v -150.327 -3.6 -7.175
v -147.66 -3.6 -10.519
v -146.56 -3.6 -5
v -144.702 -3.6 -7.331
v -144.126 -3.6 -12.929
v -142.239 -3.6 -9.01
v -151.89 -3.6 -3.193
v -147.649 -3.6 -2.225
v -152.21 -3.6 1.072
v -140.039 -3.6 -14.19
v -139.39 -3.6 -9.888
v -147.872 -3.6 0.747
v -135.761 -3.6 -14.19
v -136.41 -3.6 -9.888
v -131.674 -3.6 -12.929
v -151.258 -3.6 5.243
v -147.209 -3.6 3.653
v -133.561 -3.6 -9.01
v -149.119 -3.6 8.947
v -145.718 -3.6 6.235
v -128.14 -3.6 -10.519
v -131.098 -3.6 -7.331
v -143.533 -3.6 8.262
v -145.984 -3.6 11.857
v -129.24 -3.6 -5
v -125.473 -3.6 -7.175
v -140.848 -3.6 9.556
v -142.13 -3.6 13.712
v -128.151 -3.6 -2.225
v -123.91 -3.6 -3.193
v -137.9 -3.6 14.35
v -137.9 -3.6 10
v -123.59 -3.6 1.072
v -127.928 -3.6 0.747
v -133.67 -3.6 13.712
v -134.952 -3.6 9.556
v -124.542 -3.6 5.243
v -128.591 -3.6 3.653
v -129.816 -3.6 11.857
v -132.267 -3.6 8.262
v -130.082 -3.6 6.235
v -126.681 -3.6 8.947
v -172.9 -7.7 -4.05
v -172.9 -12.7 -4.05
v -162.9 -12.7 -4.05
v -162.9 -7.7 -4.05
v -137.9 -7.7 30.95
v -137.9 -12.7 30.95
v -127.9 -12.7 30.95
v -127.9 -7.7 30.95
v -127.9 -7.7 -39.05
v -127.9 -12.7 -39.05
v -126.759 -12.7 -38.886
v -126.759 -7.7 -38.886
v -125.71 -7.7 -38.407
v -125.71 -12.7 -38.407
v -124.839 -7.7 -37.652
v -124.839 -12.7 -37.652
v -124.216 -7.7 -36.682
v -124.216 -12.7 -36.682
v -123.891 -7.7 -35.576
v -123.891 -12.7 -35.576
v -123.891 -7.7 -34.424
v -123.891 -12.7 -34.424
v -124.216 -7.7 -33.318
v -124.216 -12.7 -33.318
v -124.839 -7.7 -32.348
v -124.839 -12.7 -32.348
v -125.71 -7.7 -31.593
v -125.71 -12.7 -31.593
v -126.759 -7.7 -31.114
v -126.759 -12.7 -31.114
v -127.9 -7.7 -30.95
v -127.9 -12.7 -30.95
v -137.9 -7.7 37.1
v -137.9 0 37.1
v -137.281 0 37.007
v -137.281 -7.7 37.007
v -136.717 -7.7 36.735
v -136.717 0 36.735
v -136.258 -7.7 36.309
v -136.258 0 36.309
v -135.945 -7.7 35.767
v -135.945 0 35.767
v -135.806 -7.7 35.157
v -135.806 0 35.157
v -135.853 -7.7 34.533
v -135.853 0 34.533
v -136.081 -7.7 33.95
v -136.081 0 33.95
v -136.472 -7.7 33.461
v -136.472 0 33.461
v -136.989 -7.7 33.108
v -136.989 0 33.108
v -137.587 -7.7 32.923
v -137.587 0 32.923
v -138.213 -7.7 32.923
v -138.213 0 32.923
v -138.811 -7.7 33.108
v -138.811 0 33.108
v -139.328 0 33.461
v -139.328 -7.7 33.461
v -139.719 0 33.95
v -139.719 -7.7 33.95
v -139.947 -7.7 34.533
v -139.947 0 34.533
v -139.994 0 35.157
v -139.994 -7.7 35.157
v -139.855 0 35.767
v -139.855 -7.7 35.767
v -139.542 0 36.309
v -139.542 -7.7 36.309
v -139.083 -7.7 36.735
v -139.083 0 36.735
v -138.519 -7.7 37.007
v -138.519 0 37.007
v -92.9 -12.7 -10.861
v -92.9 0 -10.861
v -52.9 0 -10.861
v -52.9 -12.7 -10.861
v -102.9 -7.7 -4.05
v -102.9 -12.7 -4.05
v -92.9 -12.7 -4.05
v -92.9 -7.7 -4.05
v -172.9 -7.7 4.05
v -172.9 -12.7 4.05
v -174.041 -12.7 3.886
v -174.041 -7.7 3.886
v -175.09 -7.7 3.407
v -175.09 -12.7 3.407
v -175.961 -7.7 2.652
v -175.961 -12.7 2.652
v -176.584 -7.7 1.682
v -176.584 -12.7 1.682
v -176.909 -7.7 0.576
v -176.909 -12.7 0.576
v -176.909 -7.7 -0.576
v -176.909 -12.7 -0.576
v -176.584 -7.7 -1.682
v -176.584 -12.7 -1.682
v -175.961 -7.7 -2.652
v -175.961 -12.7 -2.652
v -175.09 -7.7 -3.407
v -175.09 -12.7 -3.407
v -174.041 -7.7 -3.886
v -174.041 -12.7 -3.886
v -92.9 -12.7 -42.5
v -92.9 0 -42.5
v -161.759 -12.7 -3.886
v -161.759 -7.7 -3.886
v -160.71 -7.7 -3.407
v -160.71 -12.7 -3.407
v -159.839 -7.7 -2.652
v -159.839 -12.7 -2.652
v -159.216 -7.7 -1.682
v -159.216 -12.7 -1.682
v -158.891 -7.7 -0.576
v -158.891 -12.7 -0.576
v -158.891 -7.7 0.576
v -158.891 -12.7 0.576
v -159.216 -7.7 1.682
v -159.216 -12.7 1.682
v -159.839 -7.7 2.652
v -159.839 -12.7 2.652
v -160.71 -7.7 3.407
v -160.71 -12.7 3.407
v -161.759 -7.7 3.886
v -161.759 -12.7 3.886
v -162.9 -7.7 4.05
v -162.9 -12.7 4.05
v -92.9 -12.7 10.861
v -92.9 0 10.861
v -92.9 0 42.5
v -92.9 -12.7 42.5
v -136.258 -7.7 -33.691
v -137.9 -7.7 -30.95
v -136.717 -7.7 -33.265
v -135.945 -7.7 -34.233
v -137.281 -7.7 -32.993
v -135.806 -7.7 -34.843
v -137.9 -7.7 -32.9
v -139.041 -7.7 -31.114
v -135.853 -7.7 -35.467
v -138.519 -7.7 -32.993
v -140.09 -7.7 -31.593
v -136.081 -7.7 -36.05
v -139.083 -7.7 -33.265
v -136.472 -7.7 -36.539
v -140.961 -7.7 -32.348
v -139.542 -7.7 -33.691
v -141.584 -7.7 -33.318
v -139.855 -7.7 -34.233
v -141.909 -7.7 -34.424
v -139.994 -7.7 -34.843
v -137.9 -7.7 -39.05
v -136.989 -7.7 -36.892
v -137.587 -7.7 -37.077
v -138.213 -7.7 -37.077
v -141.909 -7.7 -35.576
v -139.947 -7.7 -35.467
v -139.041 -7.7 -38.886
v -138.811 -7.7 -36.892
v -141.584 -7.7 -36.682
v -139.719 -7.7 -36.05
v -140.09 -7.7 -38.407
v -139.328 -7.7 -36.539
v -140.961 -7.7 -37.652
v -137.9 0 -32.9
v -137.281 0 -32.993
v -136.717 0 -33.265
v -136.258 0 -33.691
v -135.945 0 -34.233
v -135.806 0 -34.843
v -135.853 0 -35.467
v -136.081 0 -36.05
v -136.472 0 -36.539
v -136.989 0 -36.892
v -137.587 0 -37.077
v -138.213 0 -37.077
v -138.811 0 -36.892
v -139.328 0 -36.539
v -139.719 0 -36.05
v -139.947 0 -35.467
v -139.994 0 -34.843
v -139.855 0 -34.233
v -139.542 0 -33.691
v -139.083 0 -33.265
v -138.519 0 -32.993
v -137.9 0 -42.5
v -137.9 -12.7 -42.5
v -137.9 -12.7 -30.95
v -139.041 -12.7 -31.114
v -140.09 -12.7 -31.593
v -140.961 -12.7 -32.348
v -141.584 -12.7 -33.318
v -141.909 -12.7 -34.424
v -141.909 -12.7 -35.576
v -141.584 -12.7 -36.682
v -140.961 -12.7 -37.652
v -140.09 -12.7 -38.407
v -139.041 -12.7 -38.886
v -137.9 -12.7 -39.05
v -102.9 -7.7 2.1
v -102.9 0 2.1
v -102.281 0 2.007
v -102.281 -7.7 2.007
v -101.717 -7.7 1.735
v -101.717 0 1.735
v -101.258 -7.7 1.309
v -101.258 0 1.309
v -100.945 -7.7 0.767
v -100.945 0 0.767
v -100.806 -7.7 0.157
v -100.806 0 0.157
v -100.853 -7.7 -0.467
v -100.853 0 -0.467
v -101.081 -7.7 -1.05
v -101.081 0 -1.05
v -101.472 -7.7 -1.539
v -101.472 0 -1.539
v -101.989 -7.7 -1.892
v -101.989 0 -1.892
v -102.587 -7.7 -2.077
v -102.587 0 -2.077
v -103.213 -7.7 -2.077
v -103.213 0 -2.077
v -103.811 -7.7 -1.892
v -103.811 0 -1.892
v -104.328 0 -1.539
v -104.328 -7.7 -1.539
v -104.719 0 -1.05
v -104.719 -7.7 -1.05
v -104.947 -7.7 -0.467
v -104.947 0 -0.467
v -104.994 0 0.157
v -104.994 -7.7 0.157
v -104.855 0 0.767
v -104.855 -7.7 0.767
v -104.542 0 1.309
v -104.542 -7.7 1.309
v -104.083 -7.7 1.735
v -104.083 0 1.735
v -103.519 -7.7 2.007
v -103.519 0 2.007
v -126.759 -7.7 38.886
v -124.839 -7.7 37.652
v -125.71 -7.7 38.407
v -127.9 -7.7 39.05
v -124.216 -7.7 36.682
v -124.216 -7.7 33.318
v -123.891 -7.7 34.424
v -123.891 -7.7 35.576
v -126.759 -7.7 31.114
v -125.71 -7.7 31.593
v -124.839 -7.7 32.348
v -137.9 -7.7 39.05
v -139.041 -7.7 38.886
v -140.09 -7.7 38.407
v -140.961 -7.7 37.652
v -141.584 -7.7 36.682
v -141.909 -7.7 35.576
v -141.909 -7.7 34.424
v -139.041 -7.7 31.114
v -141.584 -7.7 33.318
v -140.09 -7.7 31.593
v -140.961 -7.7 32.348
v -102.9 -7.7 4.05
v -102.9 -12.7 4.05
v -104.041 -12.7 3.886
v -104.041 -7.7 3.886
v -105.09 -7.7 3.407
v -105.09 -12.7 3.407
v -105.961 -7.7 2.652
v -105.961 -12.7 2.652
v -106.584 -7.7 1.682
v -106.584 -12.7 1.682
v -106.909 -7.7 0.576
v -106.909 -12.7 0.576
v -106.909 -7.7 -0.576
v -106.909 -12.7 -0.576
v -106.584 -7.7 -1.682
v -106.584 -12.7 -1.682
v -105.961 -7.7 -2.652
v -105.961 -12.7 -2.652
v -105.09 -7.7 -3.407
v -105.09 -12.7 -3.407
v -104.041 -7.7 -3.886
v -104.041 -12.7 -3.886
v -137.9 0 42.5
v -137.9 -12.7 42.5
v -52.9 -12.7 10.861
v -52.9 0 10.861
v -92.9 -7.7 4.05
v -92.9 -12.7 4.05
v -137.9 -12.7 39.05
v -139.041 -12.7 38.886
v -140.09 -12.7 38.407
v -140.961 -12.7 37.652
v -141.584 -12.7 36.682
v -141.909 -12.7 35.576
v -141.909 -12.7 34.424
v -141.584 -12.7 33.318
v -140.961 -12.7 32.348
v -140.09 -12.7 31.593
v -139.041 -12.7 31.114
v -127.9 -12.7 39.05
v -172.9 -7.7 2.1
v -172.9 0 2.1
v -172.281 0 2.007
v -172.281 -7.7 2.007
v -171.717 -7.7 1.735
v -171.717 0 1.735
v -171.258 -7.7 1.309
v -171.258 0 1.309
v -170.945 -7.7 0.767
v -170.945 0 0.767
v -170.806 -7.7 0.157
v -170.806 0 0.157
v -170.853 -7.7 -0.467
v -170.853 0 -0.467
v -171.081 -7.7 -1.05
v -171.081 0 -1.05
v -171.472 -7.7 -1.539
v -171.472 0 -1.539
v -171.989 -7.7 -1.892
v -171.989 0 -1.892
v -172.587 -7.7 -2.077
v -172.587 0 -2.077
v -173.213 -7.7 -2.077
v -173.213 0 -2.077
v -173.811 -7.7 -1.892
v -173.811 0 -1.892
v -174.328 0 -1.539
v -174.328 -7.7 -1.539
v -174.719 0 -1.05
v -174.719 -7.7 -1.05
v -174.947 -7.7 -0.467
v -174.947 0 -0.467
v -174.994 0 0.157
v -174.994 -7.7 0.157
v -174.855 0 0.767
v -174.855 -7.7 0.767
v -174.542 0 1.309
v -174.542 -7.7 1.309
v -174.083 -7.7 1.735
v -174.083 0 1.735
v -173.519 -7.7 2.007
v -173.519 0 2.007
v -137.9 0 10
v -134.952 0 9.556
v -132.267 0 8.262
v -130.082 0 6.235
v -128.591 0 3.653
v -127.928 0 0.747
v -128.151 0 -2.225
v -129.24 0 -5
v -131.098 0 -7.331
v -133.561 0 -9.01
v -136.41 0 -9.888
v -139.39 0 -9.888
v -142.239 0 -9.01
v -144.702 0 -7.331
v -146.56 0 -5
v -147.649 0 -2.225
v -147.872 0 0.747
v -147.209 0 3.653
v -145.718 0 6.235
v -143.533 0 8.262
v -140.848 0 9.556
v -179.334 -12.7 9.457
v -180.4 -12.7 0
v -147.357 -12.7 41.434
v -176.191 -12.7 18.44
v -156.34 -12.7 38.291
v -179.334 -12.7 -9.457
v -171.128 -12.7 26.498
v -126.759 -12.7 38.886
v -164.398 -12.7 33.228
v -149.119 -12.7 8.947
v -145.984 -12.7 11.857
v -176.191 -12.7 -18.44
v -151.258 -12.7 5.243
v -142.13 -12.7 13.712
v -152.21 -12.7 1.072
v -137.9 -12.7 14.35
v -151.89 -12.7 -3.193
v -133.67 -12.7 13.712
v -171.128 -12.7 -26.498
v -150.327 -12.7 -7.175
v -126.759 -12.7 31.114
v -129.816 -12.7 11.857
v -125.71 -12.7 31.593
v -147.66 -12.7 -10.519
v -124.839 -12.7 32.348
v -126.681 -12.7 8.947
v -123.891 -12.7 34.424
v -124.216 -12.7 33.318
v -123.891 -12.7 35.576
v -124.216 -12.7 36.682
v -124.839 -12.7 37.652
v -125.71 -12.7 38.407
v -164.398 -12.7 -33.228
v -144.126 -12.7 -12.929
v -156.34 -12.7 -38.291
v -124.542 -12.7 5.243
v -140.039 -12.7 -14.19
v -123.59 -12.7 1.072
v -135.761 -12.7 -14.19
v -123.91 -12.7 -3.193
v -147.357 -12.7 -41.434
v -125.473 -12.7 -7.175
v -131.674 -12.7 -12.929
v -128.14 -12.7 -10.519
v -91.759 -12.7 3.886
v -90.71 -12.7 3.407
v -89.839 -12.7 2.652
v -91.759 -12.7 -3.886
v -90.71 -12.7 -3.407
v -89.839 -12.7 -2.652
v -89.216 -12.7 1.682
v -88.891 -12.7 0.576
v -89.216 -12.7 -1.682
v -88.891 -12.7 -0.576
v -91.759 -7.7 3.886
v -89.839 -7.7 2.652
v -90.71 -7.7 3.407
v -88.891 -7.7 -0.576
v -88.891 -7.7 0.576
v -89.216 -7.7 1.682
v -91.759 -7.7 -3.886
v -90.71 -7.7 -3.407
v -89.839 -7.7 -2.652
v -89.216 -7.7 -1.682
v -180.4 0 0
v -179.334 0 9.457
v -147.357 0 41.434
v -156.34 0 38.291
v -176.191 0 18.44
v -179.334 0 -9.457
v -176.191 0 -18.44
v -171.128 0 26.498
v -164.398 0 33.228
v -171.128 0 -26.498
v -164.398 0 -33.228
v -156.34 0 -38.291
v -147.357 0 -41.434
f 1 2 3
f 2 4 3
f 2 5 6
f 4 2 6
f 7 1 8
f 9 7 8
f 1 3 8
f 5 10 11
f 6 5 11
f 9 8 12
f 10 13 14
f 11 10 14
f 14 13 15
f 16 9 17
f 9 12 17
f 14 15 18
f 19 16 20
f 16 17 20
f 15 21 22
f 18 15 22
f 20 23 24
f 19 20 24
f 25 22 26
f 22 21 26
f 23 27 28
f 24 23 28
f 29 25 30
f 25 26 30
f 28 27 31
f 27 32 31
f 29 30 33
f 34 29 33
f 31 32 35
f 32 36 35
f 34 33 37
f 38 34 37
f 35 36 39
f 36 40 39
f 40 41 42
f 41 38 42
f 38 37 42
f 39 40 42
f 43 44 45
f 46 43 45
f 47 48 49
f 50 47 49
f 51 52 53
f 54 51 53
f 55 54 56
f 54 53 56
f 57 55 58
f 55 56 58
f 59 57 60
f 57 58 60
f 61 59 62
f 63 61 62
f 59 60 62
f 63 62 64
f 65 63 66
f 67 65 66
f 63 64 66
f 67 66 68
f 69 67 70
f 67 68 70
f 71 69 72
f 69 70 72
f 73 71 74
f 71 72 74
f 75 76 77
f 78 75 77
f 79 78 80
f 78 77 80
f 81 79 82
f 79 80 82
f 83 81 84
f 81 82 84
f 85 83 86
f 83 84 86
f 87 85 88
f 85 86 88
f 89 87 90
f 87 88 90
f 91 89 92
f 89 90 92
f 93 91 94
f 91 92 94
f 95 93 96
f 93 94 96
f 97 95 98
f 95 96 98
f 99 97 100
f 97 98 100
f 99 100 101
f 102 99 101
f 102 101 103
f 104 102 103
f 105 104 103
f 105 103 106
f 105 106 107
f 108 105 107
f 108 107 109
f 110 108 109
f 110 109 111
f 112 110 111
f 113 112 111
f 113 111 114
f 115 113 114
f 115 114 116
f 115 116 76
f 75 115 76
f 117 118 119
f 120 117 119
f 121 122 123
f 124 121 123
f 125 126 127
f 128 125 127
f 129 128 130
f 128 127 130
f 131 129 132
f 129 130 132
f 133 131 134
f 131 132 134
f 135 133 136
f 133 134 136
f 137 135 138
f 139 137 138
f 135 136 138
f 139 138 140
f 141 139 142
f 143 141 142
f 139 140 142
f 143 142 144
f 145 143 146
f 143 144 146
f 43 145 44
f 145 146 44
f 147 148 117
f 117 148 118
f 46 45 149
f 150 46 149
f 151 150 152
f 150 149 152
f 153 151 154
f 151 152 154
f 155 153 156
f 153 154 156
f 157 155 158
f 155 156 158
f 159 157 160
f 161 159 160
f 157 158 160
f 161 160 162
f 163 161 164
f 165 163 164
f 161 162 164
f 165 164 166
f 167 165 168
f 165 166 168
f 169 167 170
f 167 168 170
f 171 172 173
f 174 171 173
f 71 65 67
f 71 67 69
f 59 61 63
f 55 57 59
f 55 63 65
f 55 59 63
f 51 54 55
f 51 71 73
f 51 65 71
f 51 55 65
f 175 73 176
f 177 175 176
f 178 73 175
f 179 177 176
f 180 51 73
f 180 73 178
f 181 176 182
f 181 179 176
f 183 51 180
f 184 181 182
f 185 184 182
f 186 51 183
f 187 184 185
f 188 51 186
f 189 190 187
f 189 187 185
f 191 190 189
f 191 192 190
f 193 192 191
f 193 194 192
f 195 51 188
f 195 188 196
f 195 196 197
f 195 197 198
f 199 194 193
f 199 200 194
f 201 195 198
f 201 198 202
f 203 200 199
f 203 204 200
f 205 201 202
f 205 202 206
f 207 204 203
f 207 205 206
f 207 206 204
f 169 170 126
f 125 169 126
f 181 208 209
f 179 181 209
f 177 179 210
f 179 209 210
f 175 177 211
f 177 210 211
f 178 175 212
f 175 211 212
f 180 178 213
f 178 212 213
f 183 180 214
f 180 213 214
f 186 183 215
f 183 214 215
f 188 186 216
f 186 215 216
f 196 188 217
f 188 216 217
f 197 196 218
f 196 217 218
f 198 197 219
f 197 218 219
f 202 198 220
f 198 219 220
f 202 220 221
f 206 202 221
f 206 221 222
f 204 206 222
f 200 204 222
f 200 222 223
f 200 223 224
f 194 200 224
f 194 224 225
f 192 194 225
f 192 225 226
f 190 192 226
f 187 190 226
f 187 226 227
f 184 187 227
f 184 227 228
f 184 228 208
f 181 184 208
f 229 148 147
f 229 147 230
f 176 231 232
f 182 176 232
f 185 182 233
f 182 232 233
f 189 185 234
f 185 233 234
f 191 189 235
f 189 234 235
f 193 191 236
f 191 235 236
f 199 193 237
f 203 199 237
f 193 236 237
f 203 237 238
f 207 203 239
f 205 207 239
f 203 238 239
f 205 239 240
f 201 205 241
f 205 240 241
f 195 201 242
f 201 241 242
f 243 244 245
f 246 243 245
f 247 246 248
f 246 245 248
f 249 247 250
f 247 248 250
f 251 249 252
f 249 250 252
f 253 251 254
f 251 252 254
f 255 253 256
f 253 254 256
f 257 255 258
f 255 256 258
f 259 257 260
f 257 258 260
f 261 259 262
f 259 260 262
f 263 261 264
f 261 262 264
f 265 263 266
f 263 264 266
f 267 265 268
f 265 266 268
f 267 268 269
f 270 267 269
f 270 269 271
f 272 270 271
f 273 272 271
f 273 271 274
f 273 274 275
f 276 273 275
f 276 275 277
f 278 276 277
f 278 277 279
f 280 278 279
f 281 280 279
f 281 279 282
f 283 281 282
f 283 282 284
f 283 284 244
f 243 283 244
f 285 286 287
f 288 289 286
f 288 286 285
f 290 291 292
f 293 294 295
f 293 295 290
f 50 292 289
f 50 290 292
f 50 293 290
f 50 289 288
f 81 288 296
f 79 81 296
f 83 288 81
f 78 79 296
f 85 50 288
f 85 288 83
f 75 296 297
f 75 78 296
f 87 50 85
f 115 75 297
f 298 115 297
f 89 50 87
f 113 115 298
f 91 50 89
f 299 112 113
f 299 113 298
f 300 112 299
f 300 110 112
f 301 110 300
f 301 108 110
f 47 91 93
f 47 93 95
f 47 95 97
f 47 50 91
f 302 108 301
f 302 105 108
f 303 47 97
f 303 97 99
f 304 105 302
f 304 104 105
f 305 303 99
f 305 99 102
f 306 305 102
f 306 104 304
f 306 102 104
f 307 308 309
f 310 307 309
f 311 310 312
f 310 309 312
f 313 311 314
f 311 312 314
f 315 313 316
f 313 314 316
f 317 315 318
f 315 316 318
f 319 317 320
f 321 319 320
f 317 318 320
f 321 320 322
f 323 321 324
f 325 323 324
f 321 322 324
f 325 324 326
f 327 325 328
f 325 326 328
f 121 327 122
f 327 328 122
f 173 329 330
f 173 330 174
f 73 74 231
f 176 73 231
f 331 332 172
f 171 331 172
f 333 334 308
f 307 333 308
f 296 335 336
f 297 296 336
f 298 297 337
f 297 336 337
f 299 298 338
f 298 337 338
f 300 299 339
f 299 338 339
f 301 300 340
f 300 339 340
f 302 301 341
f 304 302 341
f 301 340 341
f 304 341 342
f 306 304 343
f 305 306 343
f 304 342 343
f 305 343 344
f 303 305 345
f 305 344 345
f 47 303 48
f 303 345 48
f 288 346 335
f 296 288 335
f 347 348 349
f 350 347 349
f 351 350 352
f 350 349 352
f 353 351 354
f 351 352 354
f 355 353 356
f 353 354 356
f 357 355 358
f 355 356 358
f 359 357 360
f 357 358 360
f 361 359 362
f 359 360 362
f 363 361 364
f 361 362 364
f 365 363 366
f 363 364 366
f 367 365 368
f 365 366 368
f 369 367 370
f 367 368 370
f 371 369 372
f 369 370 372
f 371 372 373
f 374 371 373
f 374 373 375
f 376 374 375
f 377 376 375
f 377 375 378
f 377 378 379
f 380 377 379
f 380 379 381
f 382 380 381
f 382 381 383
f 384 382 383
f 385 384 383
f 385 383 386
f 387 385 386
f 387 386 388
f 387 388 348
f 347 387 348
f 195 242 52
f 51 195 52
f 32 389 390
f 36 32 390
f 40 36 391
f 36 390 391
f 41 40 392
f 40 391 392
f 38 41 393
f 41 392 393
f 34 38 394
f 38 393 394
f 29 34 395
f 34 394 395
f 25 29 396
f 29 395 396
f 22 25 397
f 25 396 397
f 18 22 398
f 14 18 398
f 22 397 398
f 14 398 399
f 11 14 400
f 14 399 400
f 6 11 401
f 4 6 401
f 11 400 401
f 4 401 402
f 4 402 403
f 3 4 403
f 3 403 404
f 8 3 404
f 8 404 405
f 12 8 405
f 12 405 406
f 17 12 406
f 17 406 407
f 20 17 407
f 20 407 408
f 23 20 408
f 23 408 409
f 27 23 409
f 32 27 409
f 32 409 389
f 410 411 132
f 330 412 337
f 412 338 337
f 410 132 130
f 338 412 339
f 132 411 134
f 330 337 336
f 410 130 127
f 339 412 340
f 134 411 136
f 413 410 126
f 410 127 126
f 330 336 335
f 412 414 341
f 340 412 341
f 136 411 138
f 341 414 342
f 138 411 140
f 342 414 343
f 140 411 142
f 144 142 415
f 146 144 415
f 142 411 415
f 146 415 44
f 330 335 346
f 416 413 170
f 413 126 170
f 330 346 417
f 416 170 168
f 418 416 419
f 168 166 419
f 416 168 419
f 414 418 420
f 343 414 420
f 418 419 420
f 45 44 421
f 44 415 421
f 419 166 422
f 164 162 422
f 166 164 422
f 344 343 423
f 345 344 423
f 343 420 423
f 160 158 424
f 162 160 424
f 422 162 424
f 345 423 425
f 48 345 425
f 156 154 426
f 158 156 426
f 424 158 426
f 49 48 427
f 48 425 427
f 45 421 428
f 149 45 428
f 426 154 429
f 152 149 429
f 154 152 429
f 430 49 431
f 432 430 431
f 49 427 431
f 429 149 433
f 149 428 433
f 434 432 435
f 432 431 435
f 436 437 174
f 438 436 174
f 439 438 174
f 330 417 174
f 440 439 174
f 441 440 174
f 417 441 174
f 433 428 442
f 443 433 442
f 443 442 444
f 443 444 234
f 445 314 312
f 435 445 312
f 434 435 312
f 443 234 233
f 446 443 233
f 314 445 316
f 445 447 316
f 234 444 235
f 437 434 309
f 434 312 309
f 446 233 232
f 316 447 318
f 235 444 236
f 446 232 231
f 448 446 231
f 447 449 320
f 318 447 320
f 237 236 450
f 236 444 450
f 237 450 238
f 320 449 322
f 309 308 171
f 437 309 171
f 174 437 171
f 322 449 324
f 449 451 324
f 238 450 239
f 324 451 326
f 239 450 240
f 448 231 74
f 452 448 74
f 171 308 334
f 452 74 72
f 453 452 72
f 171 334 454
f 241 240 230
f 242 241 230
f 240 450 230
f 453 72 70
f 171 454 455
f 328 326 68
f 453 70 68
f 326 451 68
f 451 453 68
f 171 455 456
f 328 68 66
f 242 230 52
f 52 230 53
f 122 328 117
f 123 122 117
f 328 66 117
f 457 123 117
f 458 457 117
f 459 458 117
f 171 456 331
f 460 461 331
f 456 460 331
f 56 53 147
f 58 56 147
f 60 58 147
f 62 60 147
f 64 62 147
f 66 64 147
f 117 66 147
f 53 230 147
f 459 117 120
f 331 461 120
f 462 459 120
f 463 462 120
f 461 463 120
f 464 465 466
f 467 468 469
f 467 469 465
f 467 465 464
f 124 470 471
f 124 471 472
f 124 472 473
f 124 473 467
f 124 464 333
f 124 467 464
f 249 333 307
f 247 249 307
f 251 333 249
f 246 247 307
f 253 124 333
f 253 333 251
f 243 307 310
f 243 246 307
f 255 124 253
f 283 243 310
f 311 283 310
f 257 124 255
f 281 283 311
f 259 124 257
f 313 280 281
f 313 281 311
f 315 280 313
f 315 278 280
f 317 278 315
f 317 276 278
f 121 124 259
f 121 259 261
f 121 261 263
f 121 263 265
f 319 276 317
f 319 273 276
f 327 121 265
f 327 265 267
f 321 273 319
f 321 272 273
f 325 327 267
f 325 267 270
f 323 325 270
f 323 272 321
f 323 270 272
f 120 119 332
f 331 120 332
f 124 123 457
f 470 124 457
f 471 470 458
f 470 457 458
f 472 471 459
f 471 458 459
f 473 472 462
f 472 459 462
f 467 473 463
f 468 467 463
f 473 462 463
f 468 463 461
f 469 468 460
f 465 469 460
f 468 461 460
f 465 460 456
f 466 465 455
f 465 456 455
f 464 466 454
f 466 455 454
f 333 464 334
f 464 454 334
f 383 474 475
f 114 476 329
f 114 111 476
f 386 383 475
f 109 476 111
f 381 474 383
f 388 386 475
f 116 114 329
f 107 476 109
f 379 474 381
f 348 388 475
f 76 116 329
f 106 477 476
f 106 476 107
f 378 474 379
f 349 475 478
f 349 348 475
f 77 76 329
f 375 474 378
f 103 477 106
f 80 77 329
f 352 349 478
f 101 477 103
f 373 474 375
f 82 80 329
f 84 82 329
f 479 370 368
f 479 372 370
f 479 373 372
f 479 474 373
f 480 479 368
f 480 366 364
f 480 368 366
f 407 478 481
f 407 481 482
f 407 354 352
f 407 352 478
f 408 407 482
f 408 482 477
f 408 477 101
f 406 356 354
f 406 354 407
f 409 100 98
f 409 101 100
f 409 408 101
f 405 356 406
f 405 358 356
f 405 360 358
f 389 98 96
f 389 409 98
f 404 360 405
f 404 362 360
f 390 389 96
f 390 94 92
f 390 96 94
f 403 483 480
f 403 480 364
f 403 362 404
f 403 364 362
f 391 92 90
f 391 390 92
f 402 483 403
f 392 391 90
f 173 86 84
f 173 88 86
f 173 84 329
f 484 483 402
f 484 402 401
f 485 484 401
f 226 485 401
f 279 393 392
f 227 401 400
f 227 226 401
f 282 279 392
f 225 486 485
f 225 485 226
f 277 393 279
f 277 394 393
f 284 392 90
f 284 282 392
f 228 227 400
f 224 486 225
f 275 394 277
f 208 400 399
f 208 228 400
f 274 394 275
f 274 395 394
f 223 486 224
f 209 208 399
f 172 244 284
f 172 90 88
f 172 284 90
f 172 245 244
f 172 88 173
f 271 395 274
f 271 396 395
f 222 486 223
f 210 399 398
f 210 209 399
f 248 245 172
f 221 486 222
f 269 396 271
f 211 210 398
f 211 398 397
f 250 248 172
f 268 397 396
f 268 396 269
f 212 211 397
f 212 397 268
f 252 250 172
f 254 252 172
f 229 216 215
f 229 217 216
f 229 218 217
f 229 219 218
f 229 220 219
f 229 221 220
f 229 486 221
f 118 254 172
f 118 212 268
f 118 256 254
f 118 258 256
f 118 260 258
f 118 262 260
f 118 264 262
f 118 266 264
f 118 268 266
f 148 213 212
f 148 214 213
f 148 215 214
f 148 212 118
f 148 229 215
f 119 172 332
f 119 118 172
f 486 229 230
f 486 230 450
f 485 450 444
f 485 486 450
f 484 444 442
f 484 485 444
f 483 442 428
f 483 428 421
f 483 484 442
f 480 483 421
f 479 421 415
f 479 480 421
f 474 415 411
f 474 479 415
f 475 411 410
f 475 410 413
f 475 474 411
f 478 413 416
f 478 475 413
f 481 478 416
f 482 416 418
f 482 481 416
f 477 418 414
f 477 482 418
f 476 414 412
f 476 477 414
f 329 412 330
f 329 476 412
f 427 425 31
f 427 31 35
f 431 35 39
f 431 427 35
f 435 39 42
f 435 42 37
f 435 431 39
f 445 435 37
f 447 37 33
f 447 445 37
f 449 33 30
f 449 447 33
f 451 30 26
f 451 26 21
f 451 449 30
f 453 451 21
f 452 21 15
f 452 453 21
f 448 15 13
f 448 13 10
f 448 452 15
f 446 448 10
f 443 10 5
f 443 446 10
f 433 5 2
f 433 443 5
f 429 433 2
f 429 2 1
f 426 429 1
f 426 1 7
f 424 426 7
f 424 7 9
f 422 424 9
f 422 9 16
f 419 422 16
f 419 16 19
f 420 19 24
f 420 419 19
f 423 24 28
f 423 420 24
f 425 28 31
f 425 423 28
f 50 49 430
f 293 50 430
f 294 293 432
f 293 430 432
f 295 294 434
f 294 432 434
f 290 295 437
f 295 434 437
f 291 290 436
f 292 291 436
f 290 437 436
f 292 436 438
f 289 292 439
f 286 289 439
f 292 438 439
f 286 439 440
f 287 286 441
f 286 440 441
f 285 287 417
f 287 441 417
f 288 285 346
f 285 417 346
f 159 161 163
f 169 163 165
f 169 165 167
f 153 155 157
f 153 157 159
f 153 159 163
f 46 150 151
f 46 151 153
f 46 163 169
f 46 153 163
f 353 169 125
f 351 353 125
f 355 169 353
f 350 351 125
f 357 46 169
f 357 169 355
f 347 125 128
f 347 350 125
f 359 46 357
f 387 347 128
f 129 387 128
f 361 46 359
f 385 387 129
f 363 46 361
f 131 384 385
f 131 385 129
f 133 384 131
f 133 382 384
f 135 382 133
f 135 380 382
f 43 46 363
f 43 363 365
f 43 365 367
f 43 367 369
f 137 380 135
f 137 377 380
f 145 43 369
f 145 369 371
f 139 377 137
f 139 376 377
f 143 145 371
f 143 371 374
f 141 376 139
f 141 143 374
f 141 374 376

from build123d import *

# Parameters (mm, degrees)
SKETCH1_R           = 2.1
SKETCH1_R_2         = 10
BOSS_EXTRUDE1_DEPTH = 12.7
SKETCH2_R           = 14.35
CUT_EXTRUDE1_DEPTH  = 8.1
CUT_EXTRUDE2_START  = -12.7
SKETCH3_R           = 14.35
CUT_EXTRUDE2_DEPTH  = 9.1
CUT_EXTRUDE3_START  = -12.7
CUT_EXTRUDE3_DEPTH  = 5
CUT_EXTRUDE4_DEPTH  = 20


with BuildPart() as part:
    # Sketch1 → Boss-Extrude1 (new body)
    with BuildSketch(Plane(origin=(0, 0, 0), x_dir=(1, 0, 0), z_dir=(0, 1, 0))):
        with BuildLine():
            Line((0, 42.5), (-137.9, 42.5))
            ThreePointArc((-137.9, 42.5), (-180.4, 0), (-137.9, -42.5))
            Line((-137.9, -42.5), (0, -42.5))
            ThreePointArc((0, -42.5), (42.5, 0), (0, 42.5))
        make_face()
        with Locations(Location((-102.9, 0, 0), (0, 0, 270))):
            Circle(SKETCH1_R, mode=Mode.SUBTRACT)
        with Locations(Location((-137.9, 35, 0), (0, 0, 270))):
            Circle(SKETCH1_R, mode=Mode.SUBTRACT)
        with Locations(Location((-137.9, -35, 0), (0, 0, 270))):
            Circle(SKETCH1_R, mode=Mode.SUBTRACT)
        with Locations(Location((-172.9, 0, 0), (0, 0, 270))):
            Circle(SKETCH1_R, mode=Mode.SUBTRACT)
        with Locations(Location((-137.9, 0, 0), (0, 0, 270))):
            Circle(SKETCH1_R_2, mode=Mode.SUBTRACT)
        with Locations(Location((0, 35, 0), (0, 0, 270))):
            Circle(SKETCH1_R, mode=Mode.SUBTRACT)
        with Locations(Location((0, -35, 0), (0, 0, 270))):
            Circle(SKETCH1_R, mode=Mode.SUBTRACT)
        with Locations(Location((-17.67766953, -17.67766953, 0), (0, 0, 270))):
            Circle(SKETCH1_R, mode=Mode.SUBTRACT)
        with Locations(Location((17.67766953, -17.67766953, 0), (0, 0, 270))):
            Circle(SKETCH1_R, mode=Mode.SUBTRACT)
        with Locations(Location((-35, 0, 0), (0, 0, 270))):
            Circle(SKETCH1_R, mode=Mode.SUBTRACT)
        with Locations(Location((-17.67766953, 17.67766953, 0), (0, 0, 270))):
            Circle(SKETCH1_R, mode=Mode.SUBTRACT)
        with Locations(Location((0, 0, 0), (0, 0, 270))):
            Circle(SKETCH1_R_2, mode=Mode.SUBTRACT)
        with Locations(Location((35, 0, 0), (0, 0, 270))):
            Circle(SKETCH1_R, mode=Mode.SUBTRACT)
        with Locations(Location((17.67766953, 17.67766953, 0), (0, 0, 270))):
            Circle(SKETCH1_R, mode=Mode.SUBTRACT)
    extrude(amount=-BOSS_EXTRUDE1_DEPTH)

    # Sketch2 → Cut-Extrude1 (cut)
    with BuildSketch(Plane(origin=(0, 0, 0), x_dir=(1, 0, 0), z_dir=(0, 1, 0))):
        with Locations(Location((0, 0, 0), (0, 0, 270))):
            Circle(SKETCH2_R)
    extrude(amount=-CUT_EXTRUDE1_DEPTH, mode=Mode.SUBTRACT)

    # Sketch3 → Cut-Extrude2 (cut)
    with BuildSketch(Plane(origin=(0, 0, 0), x_dir=(1, 0, 0), z_dir=(0, 1, 0)).offset(CUT_EXTRUDE2_START)):
        with Locations(Location((-137.9, 0, 0), (0, 0, 270))):
            Circle(SKETCH3_R)
    extrude(amount=CUT_EXTRUDE2_DEPTH, mode=Mode.SUBTRACT)

    # Sketch4 → Cut-Extrude3 (cut)
    with BuildSketch(Plane(origin=(0, 0, 0), x_dir=(1, 0, 0), z_dir=(0, 1, 0)).offset(CUT_EXTRUDE3_START)):
        with BuildLine():
            Line((-162.9, -4.05), (-172.9, -4.05))
            ThreePointArc((-172.9, -4.05), (-176.95, 0), (-172.9, 4.05))
            Line((-172.9, 4.05), (-162.9, 4.05))
            ThreePointArc((-162.9, 4.05), (-158.85, 0), (-162.9, -4.05))
        make_face()
        with BuildLine():
            Line((-137.9, -30.95), (-127.9, -30.95))
            ThreePointArc((-127.9, -30.95), (-123.85, -35), (-127.9, -39.05))
            Line((-127.9, -39.05), (-137.9, -39.05))
            ThreePointArc((-137.9, -39.05), (-141.95, -35), (-137.9, -30.95))
        make_face()
        with BuildLine():
            Line((-92.9, -4.05), (-102.9, -4.05))
            ThreePointArc((-102.9, -4.05), (-106.95, 0), (-102.9, 4.05))
            Line((-102.9, 4.05), (-92.9, 4.05))
            ThreePointArc((-92.9, 4.05), (-88.85, 0), (-92.9, -4.05))
        make_face()
        with BuildLine():
            Line((-137.9, 39.05), (-127.9, 39.05))
            ThreePointArc((-127.9, 39.05), (-123.85, 35), (-127.9, 30.95))
            Line((-127.9, 30.95), (-137.9, 30.95))
            ThreePointArc((-137.9, 30.95), (-141.95, 35), (-137.9, 39.05))
        make_face()
    extrude(amount=CUT_EXTRUDE3_DEPTH, mode=Mode.SUBTRACT)

    # Sketch6 → Cut-Extrude4 (cut)
    with BuildSketch(Plane(origin=(0, 0, 0), x_dir=(1, 0, 0), z_dir=(0, 1, 0))):
        Polygon((-92.9, 10.860556918), (-52.9, 10.860556918), (-52.9, -10.860556918), (-92.9, -10.860556918), (-92.9, -58.166636569), (47.985280952, -58.166636569), (47.985280952, 58.166636569), (-92.9, 58.166636569), align=None)
    extrude(amount=-CUT_EXTRUDE4_DEPTH, mode=Mode.SUBTRACT)


solid = part.part
